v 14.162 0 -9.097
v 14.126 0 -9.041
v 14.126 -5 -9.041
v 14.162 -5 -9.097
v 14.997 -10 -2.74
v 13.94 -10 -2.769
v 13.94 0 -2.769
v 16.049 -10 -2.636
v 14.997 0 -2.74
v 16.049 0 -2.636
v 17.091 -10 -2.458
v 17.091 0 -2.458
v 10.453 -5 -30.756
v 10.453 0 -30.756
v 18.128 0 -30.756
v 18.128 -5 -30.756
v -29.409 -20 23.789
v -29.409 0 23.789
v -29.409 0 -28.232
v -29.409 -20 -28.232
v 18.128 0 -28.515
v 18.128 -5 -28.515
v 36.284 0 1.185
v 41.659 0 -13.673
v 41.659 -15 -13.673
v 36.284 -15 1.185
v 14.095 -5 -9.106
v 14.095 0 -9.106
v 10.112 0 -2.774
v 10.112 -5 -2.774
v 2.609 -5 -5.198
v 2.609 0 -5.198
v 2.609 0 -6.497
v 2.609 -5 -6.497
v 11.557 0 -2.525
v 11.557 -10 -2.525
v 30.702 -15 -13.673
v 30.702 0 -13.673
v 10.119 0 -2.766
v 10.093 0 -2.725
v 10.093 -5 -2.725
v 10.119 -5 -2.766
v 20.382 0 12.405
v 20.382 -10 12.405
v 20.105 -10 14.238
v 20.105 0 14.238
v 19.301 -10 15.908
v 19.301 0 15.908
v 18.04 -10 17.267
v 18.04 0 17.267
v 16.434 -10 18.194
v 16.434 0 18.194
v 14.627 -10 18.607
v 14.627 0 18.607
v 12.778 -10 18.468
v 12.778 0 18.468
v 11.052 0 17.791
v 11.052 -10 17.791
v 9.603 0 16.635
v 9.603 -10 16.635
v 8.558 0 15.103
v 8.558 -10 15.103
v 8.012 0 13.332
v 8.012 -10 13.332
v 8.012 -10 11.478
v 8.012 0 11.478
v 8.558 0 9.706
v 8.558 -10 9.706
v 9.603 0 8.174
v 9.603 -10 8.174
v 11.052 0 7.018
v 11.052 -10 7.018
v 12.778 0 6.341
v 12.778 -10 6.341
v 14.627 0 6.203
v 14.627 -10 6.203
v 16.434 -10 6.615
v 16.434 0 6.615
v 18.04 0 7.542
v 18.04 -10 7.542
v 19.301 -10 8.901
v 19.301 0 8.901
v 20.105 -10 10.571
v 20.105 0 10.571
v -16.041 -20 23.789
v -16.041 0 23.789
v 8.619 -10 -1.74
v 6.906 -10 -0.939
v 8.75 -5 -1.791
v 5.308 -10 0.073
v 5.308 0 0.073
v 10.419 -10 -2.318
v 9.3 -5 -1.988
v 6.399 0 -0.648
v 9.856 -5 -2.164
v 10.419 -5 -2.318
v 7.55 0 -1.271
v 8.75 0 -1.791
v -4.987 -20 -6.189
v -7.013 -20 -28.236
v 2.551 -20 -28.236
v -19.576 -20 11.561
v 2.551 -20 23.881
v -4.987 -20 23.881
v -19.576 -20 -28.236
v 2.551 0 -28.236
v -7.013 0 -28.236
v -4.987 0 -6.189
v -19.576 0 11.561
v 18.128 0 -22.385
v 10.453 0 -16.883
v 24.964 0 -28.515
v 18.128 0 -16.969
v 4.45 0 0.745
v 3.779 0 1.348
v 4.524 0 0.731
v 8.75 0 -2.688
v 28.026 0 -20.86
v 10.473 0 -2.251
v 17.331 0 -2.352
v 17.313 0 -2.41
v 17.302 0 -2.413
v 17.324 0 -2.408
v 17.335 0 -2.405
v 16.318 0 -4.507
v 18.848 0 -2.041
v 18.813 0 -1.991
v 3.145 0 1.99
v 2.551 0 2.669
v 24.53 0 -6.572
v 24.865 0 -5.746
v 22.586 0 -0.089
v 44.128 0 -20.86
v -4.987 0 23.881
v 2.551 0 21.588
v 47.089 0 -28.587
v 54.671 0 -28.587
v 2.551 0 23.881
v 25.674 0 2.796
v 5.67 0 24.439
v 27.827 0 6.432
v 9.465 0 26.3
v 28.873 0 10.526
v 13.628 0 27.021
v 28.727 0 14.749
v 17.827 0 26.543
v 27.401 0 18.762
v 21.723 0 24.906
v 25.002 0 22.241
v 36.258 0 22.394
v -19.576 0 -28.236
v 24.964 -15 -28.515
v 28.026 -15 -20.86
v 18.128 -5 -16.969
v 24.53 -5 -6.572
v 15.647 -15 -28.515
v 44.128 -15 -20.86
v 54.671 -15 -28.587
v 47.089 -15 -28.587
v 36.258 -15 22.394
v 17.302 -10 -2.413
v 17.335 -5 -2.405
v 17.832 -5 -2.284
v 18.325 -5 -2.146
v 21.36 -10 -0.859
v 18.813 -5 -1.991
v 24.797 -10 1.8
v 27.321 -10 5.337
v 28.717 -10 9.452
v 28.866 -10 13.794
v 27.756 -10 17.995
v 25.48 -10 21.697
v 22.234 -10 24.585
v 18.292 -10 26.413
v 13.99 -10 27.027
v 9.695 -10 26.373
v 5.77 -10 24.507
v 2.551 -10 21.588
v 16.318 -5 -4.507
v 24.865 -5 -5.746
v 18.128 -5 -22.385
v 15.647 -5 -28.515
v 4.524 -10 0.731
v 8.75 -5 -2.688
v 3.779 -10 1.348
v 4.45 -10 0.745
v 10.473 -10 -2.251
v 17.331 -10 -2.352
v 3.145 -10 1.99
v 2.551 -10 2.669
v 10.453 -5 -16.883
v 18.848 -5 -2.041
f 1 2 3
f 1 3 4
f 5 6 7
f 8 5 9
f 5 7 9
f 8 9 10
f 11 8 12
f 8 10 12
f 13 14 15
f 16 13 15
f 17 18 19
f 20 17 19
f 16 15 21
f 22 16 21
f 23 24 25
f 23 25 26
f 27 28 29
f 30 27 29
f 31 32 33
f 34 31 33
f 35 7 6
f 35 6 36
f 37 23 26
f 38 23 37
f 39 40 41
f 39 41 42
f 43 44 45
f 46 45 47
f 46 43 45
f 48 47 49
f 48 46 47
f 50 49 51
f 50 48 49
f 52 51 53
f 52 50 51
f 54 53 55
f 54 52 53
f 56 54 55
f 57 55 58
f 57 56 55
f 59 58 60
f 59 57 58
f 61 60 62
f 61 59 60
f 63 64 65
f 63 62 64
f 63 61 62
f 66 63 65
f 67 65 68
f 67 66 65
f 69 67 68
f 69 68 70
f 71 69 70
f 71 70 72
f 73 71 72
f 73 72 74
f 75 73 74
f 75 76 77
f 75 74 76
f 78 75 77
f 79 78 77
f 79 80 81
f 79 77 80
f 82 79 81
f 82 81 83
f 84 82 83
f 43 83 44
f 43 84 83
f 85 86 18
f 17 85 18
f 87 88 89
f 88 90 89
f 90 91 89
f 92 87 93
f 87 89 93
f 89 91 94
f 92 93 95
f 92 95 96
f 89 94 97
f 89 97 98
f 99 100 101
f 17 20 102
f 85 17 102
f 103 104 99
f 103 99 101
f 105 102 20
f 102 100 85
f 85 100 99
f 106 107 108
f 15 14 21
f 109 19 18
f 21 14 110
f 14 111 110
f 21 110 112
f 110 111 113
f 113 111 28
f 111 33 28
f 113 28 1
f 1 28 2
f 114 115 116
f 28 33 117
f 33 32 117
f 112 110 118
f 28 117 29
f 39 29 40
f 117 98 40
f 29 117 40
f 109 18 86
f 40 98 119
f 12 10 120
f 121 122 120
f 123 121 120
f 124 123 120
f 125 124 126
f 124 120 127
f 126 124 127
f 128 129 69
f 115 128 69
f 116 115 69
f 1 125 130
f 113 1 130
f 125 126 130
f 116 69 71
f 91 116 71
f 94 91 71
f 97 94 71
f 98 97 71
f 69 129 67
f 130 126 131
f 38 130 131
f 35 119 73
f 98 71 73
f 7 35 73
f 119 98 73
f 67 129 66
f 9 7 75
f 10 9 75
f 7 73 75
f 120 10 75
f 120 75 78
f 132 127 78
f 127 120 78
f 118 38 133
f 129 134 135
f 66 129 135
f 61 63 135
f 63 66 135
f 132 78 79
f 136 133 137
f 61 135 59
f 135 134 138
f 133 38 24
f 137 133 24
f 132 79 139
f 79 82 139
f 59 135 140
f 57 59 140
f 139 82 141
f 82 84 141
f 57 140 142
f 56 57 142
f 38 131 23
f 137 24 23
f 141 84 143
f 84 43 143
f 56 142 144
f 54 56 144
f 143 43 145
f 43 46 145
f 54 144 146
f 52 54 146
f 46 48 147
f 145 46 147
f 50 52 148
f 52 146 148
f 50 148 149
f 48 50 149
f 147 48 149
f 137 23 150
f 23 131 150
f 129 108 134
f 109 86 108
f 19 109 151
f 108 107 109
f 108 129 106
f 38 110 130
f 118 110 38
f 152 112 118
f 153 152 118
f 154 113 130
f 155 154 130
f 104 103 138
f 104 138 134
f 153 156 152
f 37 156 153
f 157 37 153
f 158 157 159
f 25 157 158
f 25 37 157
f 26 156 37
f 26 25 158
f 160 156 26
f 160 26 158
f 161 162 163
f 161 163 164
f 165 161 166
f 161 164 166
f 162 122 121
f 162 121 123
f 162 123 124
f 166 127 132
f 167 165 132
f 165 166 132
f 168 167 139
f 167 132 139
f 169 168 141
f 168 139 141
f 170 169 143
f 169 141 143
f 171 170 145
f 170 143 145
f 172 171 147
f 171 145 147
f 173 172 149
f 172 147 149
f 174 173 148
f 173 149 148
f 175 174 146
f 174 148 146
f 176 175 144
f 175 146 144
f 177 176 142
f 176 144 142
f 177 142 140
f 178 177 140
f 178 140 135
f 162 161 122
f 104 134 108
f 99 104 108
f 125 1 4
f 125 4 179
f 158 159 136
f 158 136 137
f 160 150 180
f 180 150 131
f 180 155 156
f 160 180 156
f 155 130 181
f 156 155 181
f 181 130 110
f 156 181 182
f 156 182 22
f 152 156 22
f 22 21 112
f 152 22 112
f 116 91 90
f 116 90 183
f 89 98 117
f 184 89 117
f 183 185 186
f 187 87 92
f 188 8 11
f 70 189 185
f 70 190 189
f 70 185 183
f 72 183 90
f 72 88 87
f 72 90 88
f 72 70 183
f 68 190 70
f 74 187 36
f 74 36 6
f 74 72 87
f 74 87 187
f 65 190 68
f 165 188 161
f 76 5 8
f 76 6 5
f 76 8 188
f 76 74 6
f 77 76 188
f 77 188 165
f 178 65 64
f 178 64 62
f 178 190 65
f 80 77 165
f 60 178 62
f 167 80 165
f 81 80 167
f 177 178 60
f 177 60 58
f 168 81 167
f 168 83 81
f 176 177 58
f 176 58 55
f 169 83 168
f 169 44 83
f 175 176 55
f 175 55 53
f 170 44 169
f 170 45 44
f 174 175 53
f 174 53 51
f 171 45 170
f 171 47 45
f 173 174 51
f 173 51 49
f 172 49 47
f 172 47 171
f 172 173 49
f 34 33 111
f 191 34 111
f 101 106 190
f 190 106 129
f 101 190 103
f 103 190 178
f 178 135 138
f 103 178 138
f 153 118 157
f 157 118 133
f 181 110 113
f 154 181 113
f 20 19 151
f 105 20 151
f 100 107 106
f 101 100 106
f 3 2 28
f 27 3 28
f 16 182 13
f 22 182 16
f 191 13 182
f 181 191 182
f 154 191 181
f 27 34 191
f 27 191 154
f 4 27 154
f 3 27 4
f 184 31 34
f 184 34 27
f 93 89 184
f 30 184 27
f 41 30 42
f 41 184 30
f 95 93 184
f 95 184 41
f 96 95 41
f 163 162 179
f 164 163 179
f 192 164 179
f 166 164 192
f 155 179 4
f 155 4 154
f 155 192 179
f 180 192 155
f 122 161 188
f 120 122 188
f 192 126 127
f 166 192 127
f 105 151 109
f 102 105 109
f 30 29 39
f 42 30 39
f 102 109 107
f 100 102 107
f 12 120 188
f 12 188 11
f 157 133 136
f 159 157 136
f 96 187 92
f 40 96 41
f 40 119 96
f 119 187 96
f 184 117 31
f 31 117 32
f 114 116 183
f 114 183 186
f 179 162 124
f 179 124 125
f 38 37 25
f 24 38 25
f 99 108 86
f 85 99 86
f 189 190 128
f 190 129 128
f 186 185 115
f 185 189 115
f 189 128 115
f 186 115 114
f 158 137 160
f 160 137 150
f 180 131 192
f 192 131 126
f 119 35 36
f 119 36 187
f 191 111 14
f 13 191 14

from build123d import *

# Parameters (mm, degrees)
F6_DEPTH  = 20
F7_DEPTH  = 5
F2_R      = 14.8981709713
F8_DEPTH  = 10
F9_DEPTH  = 15
F5_R      = 6.2195311323
F10_DEPTH = 20.001


with BuildPart() as f6:
    # F1 (on Front) → F6 (new body)
    with BuildSketch(Plane.XZ):
        Polygon((-29.4090751559, 23.7889681011), (-29.4090751559, -28.2321553677), (-19.5761136711, -28.2358180233), (-19.5761136711, 11.5612922236), (-7.0128426887, -28.2359085977), (2.5514548179, -28.2359085977), (2.5514548179, 23.8814018667), (-4.9865087494, 23.8814018667), (-4.9865087494, -6.1893938109), (-16.0414669663, 23.7889681011), align=None)
    extrude(amount=F6_DEPTH)



with BuildPart() as f7:
    # F3 (on Front) → F7 (new body)
    with BuildSketch(Plane.XZ):
        Polygon((10.5204042047, -2.2638426162), (8.7501741946, -1.767860345), (8.7501741946, -2.6882454621), (2.6086692233, -5.1982523873), (2.6086692233, -6.4965714701), (10.4526793584, -16.883123666), (10.4526793584, -30.7555552572), (18.1284062564, -30.7555552572), (18.1284062564, -16.9692430645), (24.9908941437, -5.8241511643), (18.8475046307, -2.0414155442), (18.2504130668, -1.177824098), (17.1879893938, -1.9123892853), (17.4144990742, -2.239997033), (14.0946339816, -9.1059375554), (10.1119214669, -2.7744469699), align=None)
    extrude(amount=F7_DEPTH)


with BuildPart() as f6_1:
    add(f6.part)

    add(f7.part)  # F8 merges F7
    # F2 (on Front) → F8 (join)
    with BuildSketch(Plane.XZ):
        with Locations((14.0610327944, 12.1286660433)):
            Circle(F2_R)
    extrude(amount=F8_DEPTH)

    # F4 (on Front) → F9 (join)
    with BuildSketch(Plane.XZ):
        Polygon((54.6711832285, -28.5867527127), (36.2575501204, 22.3937444389), (15.6466114905, -28.5145416856), (24.9638519287, -28.5145416856), (28.0255712569, -20.860247314), (44.1284738481, -20.860247314), (47.089099884, -28.5867527127), align=None)
    extrude(amount=F9_DEPTH)

    # F5 (on Front) + F0 (on Front) → F10 (cut, through all)
    with BuildSketch(Plane.XZ):
        Polygon((10.4725992623, -2.2513235357), (10.0927506823, -2.7248826654), (14.1619760543, -9.0967444703), (17.3306893557, -2.3522656411), (16.3500196487, -2.7850975748), (14.0968551859, -2.7850975748), (11.5571627393, -2.5246159639), align=None)
        with Locations((14.1619760543, 12.4046513811)):
            Circle(F5_R)
        Polygon((4.5241662301, 0.7314007962), (4.2605670169, 0.7808398308), (4.2605670169, -4.4249454513), (8.7323186063, -2.633718365), (8.7323186063, -1.8077495305), (7.9755438492, -1.6129313735), (6.1521744356, -0.636126264), align=None)
    with BuildSketch(Plane.XZ):
        Polygon((30.7015124708, -13.6729935011), (41.6589528322, -13.6729935011), (36.2836048007, 1.1847094047), align=None)
    extrude(amount=F10_DEPTH, mode=Mode.SUBTRACT)


solid = f6_1.part
